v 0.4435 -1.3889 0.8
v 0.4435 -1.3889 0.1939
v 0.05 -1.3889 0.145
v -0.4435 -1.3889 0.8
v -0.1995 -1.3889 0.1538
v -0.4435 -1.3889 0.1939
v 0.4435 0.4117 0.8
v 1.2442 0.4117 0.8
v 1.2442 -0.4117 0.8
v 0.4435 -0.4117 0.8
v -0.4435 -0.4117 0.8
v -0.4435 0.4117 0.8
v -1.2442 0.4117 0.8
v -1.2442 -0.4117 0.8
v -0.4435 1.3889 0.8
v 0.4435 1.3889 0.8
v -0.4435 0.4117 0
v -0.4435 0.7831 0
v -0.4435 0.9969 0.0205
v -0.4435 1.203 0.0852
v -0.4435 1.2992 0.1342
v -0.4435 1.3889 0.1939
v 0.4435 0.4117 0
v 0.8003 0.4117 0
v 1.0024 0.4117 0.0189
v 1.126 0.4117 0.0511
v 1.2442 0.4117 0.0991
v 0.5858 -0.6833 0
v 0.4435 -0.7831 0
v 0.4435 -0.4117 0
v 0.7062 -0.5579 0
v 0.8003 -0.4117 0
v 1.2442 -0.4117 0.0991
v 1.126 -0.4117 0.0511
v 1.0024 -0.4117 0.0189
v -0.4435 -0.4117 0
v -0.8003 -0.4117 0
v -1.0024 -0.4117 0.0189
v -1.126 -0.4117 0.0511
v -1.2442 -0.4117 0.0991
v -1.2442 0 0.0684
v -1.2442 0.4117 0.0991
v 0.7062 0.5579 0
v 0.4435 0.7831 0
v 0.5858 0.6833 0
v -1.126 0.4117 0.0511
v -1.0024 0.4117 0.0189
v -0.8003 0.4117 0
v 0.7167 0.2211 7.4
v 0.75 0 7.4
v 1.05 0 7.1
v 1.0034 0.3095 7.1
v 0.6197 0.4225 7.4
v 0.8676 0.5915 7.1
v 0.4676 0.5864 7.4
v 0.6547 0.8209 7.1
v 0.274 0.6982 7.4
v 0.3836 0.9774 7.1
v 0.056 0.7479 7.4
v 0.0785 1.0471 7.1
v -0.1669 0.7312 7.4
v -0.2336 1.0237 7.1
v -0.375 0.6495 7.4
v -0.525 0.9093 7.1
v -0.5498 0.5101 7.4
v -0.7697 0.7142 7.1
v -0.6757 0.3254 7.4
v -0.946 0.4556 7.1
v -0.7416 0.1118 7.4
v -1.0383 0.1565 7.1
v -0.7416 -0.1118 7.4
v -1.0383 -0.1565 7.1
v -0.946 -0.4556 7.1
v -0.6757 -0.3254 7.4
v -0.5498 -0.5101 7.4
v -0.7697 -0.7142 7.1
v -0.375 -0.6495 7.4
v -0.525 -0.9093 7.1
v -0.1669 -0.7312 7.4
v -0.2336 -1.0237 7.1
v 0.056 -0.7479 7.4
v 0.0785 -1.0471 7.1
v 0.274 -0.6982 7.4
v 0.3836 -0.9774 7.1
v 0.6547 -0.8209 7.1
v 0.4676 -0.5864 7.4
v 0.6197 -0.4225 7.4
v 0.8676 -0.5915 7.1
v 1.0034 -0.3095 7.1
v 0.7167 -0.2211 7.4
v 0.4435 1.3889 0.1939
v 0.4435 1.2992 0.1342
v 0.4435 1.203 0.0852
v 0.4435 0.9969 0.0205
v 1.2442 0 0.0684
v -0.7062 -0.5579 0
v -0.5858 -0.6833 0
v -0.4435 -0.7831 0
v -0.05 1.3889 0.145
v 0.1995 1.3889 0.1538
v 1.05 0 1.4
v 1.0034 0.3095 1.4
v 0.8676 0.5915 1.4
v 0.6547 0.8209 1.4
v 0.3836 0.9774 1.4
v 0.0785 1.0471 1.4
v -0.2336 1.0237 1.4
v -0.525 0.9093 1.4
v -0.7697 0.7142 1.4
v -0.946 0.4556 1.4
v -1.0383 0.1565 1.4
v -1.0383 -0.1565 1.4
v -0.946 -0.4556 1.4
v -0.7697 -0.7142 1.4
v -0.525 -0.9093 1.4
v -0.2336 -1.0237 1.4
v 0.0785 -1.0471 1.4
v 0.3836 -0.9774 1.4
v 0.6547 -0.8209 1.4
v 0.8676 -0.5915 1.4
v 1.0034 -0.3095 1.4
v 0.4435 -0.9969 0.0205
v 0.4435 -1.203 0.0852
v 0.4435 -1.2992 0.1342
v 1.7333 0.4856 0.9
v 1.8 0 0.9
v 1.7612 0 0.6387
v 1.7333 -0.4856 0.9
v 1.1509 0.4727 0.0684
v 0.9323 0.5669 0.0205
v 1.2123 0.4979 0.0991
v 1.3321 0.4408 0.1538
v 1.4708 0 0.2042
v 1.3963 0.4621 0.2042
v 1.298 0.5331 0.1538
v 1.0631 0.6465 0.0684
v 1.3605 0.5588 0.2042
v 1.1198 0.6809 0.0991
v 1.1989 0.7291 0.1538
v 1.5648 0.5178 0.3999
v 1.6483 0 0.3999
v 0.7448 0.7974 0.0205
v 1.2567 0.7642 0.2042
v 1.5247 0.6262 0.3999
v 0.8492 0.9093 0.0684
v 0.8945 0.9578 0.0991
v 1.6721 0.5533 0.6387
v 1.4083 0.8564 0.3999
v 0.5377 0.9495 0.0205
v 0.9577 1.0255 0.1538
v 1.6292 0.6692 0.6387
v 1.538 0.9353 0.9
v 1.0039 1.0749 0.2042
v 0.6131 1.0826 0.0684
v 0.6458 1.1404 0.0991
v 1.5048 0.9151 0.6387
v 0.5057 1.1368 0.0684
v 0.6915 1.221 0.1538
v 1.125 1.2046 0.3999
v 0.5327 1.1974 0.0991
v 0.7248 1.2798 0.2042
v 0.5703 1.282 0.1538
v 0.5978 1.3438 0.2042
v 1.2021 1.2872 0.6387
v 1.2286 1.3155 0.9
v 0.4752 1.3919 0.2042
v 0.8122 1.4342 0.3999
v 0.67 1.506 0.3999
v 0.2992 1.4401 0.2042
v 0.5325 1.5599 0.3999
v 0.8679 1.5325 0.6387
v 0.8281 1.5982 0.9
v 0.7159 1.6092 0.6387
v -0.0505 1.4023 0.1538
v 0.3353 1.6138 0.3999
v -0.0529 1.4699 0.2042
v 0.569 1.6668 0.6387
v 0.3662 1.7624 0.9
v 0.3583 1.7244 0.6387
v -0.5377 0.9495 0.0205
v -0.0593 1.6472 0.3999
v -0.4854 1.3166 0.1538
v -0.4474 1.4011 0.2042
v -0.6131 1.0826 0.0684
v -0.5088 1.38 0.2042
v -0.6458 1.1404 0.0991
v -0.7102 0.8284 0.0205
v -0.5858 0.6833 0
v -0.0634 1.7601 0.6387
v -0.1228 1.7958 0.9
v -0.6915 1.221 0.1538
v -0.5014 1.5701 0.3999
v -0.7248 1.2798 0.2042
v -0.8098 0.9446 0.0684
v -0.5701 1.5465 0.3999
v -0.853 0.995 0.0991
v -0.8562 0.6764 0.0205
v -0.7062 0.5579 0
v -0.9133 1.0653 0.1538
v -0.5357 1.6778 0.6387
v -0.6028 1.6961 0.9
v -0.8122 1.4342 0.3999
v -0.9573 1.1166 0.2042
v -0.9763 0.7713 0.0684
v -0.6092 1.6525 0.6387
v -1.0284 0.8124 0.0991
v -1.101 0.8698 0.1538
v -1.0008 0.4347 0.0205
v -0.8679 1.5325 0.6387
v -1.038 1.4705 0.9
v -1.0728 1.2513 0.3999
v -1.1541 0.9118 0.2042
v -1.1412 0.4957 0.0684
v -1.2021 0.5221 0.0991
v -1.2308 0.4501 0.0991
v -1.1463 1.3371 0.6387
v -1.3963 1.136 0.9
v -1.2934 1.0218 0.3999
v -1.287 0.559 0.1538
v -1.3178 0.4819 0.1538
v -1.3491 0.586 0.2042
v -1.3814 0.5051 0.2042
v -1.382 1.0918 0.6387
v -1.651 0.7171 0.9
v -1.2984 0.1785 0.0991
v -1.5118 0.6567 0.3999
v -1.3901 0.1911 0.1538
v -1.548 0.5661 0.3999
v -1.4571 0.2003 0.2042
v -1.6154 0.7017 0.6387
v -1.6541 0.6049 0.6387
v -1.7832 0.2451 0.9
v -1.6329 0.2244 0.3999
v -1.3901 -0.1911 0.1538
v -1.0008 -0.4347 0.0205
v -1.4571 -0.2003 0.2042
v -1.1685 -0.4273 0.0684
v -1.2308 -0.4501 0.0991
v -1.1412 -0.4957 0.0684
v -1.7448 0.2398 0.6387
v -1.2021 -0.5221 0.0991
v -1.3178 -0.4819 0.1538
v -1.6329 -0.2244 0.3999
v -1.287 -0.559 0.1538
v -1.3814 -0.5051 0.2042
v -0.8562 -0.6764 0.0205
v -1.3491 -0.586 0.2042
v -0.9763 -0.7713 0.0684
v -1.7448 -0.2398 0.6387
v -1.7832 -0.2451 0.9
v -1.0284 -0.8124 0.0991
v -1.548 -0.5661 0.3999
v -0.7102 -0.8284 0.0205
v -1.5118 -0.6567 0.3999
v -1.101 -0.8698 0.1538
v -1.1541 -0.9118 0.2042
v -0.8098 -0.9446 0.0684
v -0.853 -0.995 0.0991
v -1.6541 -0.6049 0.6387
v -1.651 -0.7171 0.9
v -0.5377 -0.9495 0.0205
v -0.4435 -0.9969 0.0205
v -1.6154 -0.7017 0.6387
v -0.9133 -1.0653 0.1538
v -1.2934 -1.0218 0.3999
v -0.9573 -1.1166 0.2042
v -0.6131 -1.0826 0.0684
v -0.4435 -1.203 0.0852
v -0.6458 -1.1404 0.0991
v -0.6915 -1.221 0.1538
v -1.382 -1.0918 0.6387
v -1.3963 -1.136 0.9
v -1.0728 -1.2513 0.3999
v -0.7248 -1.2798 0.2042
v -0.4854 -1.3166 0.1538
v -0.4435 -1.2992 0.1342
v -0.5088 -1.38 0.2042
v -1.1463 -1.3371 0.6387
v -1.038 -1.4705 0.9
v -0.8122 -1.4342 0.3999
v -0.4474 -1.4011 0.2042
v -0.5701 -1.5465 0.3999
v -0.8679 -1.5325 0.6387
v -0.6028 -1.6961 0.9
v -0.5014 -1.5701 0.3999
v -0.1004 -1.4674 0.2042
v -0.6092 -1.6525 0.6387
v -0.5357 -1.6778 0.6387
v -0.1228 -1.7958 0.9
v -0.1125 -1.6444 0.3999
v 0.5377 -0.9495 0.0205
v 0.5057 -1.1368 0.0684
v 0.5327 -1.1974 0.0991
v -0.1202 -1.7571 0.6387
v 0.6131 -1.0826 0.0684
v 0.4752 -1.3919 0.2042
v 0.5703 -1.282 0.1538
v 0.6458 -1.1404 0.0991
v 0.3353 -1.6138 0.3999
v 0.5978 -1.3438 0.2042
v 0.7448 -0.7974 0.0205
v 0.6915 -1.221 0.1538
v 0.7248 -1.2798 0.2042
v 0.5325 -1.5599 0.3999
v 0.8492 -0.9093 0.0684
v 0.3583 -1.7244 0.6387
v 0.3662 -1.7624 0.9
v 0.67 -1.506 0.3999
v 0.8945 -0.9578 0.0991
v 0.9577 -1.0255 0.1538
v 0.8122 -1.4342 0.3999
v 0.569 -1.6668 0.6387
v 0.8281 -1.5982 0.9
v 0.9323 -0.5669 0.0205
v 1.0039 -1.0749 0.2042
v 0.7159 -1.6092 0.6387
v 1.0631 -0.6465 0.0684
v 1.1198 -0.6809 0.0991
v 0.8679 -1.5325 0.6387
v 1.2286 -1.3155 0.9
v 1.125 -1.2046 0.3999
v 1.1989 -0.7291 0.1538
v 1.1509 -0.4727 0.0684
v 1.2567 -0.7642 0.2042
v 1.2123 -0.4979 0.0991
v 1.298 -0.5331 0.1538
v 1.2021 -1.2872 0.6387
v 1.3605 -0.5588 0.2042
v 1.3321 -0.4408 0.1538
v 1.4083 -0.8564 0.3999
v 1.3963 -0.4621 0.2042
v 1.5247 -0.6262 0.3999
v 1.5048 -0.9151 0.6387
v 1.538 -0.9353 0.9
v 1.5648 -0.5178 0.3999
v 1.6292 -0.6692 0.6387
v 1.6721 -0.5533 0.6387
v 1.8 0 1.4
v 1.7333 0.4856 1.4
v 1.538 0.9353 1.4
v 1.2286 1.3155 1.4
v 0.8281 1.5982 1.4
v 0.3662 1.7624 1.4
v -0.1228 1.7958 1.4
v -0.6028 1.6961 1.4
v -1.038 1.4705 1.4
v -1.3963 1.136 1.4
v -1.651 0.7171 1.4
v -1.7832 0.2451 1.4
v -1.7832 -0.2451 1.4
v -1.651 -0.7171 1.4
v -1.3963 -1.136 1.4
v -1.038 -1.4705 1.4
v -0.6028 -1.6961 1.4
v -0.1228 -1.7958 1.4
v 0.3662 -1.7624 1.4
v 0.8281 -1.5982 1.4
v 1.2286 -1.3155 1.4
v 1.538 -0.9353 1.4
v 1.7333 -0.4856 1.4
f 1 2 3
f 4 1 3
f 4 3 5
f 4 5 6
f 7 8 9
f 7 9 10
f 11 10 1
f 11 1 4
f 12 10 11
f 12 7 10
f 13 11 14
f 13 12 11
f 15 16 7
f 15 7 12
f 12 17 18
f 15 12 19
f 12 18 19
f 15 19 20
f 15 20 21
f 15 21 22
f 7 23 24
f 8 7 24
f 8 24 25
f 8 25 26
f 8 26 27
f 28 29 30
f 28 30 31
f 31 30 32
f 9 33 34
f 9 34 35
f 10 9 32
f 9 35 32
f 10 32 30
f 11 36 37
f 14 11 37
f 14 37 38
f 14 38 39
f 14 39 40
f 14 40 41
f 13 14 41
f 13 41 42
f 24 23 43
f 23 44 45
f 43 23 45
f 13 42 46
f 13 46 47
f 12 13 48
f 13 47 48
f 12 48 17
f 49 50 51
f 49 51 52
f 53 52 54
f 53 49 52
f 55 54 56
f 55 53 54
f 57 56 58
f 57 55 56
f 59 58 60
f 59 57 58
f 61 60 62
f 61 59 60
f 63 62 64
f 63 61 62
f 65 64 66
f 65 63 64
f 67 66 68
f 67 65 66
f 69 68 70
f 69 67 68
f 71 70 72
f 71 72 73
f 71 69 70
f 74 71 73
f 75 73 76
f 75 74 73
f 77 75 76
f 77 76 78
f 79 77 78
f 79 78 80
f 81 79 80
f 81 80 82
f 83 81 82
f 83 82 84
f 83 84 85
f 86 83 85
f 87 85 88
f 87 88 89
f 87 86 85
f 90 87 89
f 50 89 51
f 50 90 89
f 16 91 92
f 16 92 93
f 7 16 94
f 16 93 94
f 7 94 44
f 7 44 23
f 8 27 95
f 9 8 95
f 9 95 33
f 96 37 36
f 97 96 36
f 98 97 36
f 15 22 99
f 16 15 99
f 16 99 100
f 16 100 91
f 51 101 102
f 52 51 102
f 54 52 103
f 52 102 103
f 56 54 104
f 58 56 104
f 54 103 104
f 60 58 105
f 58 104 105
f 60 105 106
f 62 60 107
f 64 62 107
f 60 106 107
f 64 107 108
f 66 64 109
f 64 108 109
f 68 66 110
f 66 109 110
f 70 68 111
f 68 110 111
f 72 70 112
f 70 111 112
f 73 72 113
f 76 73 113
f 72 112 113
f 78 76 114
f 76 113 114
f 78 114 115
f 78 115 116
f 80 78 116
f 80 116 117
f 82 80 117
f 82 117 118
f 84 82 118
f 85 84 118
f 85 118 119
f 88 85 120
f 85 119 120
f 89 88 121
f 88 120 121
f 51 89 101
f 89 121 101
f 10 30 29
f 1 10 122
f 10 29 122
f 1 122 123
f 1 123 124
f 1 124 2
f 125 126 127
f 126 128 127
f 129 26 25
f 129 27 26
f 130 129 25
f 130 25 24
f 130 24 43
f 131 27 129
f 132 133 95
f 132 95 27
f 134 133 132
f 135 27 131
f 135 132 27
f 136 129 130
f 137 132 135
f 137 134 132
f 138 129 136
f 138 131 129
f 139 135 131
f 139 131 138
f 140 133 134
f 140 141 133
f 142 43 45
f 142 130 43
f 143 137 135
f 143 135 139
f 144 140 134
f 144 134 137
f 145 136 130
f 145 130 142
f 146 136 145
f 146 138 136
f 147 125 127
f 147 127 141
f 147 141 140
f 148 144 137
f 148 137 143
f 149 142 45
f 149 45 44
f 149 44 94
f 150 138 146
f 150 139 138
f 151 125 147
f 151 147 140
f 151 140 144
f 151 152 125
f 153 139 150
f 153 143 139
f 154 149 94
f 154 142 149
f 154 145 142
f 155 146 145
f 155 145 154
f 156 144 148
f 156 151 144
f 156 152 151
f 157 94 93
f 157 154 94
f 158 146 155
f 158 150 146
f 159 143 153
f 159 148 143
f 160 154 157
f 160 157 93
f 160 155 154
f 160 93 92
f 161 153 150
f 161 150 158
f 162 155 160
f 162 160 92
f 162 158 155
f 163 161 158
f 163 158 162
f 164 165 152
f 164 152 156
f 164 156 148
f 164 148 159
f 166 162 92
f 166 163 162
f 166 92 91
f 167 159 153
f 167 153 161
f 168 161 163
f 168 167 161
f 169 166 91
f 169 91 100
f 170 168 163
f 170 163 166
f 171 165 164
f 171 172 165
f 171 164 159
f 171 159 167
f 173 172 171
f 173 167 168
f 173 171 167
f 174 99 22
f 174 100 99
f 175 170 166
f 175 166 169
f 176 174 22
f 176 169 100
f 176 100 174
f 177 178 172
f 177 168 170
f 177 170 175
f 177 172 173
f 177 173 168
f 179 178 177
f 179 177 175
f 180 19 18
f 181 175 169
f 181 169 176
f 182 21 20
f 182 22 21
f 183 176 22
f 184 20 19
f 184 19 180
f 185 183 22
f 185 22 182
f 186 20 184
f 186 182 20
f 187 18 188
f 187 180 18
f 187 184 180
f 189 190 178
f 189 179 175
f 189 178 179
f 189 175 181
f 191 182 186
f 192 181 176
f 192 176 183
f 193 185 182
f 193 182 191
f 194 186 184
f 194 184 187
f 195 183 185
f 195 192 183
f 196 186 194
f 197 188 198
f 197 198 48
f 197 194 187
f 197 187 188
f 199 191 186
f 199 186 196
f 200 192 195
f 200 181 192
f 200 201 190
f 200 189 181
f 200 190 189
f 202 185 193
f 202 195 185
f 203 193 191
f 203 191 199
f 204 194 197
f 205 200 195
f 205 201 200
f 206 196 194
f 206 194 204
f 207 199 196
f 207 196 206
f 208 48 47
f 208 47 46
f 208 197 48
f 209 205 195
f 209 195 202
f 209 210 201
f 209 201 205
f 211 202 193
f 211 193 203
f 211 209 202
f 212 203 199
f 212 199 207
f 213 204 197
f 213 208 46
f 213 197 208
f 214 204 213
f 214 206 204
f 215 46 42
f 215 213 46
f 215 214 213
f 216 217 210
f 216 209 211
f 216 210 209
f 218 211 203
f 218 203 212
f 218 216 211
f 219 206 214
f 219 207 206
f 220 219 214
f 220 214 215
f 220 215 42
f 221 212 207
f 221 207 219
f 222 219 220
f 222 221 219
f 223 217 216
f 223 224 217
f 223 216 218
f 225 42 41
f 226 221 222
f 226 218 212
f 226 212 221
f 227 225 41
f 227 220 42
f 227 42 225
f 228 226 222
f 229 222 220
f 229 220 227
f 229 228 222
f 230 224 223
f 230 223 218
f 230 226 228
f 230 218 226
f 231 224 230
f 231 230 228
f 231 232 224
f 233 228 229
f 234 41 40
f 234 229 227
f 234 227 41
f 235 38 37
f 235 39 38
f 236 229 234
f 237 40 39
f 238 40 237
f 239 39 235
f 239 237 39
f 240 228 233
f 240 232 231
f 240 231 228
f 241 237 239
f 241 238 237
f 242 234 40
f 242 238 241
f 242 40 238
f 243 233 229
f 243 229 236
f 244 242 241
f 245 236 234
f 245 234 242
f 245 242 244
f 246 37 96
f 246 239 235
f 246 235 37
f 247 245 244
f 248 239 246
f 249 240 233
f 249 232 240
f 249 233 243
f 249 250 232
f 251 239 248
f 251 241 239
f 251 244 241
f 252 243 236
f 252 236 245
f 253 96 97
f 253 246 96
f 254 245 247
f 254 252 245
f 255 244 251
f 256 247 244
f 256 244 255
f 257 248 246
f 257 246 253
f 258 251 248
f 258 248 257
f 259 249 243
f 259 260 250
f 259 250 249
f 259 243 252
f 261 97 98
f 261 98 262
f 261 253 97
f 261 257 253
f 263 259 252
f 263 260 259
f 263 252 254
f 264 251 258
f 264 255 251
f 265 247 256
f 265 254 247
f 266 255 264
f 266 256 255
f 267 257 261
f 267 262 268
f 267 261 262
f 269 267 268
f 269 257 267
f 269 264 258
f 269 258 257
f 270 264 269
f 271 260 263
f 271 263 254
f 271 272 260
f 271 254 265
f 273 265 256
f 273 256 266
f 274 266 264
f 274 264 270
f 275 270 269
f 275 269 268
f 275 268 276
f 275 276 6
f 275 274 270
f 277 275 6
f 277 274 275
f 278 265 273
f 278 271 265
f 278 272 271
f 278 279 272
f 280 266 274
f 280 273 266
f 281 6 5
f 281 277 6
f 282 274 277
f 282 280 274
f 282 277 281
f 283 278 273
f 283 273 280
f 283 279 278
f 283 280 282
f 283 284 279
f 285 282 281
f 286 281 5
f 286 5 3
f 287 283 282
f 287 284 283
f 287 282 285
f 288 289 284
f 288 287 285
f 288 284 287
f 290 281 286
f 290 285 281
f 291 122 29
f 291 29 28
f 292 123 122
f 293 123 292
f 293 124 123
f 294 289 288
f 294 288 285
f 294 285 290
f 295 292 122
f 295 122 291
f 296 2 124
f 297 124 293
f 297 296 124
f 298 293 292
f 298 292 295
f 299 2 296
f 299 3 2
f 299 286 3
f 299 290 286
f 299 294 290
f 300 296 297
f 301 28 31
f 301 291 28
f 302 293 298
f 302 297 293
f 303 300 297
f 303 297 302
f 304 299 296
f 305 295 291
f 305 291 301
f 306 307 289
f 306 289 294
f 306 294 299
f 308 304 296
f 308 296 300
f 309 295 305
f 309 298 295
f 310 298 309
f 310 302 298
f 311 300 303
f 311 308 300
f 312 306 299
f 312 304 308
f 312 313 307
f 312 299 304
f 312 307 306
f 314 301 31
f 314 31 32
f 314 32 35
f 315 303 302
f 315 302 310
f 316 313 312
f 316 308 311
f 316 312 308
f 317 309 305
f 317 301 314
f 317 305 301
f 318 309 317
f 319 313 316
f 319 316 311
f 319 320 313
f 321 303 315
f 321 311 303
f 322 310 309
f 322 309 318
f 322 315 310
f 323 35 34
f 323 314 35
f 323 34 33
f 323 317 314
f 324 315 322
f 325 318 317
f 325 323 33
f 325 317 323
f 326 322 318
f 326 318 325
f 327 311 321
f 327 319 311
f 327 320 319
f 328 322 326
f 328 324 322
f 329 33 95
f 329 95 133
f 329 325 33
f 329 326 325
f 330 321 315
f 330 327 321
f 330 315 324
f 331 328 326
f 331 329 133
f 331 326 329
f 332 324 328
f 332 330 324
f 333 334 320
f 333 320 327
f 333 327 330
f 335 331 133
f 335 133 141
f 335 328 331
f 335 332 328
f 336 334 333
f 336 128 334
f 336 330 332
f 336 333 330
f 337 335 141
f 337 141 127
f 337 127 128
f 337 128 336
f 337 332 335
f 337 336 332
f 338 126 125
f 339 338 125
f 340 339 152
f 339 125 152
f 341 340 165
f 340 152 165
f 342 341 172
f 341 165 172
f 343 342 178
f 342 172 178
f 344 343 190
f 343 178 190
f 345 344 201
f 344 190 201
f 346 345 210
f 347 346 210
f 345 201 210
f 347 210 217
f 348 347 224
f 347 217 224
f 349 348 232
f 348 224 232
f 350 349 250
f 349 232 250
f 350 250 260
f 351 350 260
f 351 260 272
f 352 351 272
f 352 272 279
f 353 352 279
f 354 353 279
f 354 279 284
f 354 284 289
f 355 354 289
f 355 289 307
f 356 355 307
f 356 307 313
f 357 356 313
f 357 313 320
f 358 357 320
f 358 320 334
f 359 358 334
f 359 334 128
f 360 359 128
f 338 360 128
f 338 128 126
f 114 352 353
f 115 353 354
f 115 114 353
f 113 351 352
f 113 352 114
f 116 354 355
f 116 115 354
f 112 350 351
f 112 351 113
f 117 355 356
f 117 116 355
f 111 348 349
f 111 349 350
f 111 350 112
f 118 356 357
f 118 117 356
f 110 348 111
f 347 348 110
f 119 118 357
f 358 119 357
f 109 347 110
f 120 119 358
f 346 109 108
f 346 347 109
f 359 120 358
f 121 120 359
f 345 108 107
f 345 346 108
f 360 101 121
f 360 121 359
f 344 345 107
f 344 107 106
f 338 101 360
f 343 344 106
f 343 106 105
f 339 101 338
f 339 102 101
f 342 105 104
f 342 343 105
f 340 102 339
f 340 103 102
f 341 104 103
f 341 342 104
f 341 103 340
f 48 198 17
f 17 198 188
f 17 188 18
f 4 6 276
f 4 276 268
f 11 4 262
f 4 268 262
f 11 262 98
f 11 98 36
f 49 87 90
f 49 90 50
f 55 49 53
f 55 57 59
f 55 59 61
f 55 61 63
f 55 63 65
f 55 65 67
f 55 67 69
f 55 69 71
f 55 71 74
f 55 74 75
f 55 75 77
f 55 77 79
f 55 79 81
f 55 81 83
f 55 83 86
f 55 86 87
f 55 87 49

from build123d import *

# Parameters (mm, degrees)
SKICA1_R                 = 1.8
P_IDAT_VYSUNUT_M1_DEPTH  = 1.4
ODEBRAT_VYSUNUT_M1_DEPTH = 0.8
SKICA4_R                 = 1.05
P_IDAT_VYSUNUT_M2_DEPTH  = 6
ZKOSEN_1_SIZE            = 0.3
ZAOBLIT1_R               = 0.9


with BuildPart() as part:
    # Skica1 → Přidat vysunutím1 (new body)
    with BuildSketch(Plane.XY):
        Circle(SKICA1_R)
    extrude(amount=P_IDAT_VYSUNUT_M1_DEPTH)

    # Skica2 → Odebrat vysunutím1 (cut)
    with BuildSketch(Plane(origin=(0, 0, 0), x_dir=(-1, 0, 0), z_dir=(0, 0, -1))):
        Polygon((-0.443511417, 0.411741974), (-1.244198575, 0.411741974), (-1.244198575, -0.411741974), (-0.443511417, -0.411741974), (-0.443511417, -1.388921302), (0, -1.388921302), (0.443511417, -1.388921302), (0.443511417, -0.411741974), (1.244198575, -0.411741974), (1.244198575, 0.411741974), (0.443511417, 0.411741974), (0.443511417, 1.388921302), (0, 1.388921302), (-0.443511417, 1.388921302), align=None)
    extrude(amount=-ODEBRAT_VYSUNUT_M1_DEPTH, mode=Mode.SUBTRACT)

    # Skica4 → Přidat vysunutím2 (add)
    with BuildSketch(Plane.XY.offset(1.4)):
        Circle(SKICA4_R)
    extrude(amount=P_IDAT_VYSUNUT_M2_DEPTH)

    # Zkosení1
    zkosen_1_edges = [part.edges().sort_by_distance(p)[0] for p in [
        (-1.05, 0, 7.4),
    ]]
    chamfer(zkosen_1_edges, length=ZKOSEN_1_SIZE)

    # Zaoblit1
    # the kernel refuses this fillet: 0.9 mm, written as the material it takes off along each edge
    with BuildSketch(Plane(origin=(0, 0, 0), x_dir=(1, 0, 0), z_dir=(0, -1, 0))) as zaoblit1_piece_1:
        with BuildLine():
            CenterArc((1.8 - ZAOBLIT1_R, ZAOBLIT1_R), ZAOBLIT1_R, 270, 90)
            Line((1.8 - ZAOBLIT1_R, 0), (1.8, 0))
            Line((1.8, 0), (1.8, ZAOBLIT1_R))
        make_face()
    revolve(axis=Axis((0, 0, 0), (0, 0, 1)), mode=Mode.SUBTRACT)


solid = part.part
